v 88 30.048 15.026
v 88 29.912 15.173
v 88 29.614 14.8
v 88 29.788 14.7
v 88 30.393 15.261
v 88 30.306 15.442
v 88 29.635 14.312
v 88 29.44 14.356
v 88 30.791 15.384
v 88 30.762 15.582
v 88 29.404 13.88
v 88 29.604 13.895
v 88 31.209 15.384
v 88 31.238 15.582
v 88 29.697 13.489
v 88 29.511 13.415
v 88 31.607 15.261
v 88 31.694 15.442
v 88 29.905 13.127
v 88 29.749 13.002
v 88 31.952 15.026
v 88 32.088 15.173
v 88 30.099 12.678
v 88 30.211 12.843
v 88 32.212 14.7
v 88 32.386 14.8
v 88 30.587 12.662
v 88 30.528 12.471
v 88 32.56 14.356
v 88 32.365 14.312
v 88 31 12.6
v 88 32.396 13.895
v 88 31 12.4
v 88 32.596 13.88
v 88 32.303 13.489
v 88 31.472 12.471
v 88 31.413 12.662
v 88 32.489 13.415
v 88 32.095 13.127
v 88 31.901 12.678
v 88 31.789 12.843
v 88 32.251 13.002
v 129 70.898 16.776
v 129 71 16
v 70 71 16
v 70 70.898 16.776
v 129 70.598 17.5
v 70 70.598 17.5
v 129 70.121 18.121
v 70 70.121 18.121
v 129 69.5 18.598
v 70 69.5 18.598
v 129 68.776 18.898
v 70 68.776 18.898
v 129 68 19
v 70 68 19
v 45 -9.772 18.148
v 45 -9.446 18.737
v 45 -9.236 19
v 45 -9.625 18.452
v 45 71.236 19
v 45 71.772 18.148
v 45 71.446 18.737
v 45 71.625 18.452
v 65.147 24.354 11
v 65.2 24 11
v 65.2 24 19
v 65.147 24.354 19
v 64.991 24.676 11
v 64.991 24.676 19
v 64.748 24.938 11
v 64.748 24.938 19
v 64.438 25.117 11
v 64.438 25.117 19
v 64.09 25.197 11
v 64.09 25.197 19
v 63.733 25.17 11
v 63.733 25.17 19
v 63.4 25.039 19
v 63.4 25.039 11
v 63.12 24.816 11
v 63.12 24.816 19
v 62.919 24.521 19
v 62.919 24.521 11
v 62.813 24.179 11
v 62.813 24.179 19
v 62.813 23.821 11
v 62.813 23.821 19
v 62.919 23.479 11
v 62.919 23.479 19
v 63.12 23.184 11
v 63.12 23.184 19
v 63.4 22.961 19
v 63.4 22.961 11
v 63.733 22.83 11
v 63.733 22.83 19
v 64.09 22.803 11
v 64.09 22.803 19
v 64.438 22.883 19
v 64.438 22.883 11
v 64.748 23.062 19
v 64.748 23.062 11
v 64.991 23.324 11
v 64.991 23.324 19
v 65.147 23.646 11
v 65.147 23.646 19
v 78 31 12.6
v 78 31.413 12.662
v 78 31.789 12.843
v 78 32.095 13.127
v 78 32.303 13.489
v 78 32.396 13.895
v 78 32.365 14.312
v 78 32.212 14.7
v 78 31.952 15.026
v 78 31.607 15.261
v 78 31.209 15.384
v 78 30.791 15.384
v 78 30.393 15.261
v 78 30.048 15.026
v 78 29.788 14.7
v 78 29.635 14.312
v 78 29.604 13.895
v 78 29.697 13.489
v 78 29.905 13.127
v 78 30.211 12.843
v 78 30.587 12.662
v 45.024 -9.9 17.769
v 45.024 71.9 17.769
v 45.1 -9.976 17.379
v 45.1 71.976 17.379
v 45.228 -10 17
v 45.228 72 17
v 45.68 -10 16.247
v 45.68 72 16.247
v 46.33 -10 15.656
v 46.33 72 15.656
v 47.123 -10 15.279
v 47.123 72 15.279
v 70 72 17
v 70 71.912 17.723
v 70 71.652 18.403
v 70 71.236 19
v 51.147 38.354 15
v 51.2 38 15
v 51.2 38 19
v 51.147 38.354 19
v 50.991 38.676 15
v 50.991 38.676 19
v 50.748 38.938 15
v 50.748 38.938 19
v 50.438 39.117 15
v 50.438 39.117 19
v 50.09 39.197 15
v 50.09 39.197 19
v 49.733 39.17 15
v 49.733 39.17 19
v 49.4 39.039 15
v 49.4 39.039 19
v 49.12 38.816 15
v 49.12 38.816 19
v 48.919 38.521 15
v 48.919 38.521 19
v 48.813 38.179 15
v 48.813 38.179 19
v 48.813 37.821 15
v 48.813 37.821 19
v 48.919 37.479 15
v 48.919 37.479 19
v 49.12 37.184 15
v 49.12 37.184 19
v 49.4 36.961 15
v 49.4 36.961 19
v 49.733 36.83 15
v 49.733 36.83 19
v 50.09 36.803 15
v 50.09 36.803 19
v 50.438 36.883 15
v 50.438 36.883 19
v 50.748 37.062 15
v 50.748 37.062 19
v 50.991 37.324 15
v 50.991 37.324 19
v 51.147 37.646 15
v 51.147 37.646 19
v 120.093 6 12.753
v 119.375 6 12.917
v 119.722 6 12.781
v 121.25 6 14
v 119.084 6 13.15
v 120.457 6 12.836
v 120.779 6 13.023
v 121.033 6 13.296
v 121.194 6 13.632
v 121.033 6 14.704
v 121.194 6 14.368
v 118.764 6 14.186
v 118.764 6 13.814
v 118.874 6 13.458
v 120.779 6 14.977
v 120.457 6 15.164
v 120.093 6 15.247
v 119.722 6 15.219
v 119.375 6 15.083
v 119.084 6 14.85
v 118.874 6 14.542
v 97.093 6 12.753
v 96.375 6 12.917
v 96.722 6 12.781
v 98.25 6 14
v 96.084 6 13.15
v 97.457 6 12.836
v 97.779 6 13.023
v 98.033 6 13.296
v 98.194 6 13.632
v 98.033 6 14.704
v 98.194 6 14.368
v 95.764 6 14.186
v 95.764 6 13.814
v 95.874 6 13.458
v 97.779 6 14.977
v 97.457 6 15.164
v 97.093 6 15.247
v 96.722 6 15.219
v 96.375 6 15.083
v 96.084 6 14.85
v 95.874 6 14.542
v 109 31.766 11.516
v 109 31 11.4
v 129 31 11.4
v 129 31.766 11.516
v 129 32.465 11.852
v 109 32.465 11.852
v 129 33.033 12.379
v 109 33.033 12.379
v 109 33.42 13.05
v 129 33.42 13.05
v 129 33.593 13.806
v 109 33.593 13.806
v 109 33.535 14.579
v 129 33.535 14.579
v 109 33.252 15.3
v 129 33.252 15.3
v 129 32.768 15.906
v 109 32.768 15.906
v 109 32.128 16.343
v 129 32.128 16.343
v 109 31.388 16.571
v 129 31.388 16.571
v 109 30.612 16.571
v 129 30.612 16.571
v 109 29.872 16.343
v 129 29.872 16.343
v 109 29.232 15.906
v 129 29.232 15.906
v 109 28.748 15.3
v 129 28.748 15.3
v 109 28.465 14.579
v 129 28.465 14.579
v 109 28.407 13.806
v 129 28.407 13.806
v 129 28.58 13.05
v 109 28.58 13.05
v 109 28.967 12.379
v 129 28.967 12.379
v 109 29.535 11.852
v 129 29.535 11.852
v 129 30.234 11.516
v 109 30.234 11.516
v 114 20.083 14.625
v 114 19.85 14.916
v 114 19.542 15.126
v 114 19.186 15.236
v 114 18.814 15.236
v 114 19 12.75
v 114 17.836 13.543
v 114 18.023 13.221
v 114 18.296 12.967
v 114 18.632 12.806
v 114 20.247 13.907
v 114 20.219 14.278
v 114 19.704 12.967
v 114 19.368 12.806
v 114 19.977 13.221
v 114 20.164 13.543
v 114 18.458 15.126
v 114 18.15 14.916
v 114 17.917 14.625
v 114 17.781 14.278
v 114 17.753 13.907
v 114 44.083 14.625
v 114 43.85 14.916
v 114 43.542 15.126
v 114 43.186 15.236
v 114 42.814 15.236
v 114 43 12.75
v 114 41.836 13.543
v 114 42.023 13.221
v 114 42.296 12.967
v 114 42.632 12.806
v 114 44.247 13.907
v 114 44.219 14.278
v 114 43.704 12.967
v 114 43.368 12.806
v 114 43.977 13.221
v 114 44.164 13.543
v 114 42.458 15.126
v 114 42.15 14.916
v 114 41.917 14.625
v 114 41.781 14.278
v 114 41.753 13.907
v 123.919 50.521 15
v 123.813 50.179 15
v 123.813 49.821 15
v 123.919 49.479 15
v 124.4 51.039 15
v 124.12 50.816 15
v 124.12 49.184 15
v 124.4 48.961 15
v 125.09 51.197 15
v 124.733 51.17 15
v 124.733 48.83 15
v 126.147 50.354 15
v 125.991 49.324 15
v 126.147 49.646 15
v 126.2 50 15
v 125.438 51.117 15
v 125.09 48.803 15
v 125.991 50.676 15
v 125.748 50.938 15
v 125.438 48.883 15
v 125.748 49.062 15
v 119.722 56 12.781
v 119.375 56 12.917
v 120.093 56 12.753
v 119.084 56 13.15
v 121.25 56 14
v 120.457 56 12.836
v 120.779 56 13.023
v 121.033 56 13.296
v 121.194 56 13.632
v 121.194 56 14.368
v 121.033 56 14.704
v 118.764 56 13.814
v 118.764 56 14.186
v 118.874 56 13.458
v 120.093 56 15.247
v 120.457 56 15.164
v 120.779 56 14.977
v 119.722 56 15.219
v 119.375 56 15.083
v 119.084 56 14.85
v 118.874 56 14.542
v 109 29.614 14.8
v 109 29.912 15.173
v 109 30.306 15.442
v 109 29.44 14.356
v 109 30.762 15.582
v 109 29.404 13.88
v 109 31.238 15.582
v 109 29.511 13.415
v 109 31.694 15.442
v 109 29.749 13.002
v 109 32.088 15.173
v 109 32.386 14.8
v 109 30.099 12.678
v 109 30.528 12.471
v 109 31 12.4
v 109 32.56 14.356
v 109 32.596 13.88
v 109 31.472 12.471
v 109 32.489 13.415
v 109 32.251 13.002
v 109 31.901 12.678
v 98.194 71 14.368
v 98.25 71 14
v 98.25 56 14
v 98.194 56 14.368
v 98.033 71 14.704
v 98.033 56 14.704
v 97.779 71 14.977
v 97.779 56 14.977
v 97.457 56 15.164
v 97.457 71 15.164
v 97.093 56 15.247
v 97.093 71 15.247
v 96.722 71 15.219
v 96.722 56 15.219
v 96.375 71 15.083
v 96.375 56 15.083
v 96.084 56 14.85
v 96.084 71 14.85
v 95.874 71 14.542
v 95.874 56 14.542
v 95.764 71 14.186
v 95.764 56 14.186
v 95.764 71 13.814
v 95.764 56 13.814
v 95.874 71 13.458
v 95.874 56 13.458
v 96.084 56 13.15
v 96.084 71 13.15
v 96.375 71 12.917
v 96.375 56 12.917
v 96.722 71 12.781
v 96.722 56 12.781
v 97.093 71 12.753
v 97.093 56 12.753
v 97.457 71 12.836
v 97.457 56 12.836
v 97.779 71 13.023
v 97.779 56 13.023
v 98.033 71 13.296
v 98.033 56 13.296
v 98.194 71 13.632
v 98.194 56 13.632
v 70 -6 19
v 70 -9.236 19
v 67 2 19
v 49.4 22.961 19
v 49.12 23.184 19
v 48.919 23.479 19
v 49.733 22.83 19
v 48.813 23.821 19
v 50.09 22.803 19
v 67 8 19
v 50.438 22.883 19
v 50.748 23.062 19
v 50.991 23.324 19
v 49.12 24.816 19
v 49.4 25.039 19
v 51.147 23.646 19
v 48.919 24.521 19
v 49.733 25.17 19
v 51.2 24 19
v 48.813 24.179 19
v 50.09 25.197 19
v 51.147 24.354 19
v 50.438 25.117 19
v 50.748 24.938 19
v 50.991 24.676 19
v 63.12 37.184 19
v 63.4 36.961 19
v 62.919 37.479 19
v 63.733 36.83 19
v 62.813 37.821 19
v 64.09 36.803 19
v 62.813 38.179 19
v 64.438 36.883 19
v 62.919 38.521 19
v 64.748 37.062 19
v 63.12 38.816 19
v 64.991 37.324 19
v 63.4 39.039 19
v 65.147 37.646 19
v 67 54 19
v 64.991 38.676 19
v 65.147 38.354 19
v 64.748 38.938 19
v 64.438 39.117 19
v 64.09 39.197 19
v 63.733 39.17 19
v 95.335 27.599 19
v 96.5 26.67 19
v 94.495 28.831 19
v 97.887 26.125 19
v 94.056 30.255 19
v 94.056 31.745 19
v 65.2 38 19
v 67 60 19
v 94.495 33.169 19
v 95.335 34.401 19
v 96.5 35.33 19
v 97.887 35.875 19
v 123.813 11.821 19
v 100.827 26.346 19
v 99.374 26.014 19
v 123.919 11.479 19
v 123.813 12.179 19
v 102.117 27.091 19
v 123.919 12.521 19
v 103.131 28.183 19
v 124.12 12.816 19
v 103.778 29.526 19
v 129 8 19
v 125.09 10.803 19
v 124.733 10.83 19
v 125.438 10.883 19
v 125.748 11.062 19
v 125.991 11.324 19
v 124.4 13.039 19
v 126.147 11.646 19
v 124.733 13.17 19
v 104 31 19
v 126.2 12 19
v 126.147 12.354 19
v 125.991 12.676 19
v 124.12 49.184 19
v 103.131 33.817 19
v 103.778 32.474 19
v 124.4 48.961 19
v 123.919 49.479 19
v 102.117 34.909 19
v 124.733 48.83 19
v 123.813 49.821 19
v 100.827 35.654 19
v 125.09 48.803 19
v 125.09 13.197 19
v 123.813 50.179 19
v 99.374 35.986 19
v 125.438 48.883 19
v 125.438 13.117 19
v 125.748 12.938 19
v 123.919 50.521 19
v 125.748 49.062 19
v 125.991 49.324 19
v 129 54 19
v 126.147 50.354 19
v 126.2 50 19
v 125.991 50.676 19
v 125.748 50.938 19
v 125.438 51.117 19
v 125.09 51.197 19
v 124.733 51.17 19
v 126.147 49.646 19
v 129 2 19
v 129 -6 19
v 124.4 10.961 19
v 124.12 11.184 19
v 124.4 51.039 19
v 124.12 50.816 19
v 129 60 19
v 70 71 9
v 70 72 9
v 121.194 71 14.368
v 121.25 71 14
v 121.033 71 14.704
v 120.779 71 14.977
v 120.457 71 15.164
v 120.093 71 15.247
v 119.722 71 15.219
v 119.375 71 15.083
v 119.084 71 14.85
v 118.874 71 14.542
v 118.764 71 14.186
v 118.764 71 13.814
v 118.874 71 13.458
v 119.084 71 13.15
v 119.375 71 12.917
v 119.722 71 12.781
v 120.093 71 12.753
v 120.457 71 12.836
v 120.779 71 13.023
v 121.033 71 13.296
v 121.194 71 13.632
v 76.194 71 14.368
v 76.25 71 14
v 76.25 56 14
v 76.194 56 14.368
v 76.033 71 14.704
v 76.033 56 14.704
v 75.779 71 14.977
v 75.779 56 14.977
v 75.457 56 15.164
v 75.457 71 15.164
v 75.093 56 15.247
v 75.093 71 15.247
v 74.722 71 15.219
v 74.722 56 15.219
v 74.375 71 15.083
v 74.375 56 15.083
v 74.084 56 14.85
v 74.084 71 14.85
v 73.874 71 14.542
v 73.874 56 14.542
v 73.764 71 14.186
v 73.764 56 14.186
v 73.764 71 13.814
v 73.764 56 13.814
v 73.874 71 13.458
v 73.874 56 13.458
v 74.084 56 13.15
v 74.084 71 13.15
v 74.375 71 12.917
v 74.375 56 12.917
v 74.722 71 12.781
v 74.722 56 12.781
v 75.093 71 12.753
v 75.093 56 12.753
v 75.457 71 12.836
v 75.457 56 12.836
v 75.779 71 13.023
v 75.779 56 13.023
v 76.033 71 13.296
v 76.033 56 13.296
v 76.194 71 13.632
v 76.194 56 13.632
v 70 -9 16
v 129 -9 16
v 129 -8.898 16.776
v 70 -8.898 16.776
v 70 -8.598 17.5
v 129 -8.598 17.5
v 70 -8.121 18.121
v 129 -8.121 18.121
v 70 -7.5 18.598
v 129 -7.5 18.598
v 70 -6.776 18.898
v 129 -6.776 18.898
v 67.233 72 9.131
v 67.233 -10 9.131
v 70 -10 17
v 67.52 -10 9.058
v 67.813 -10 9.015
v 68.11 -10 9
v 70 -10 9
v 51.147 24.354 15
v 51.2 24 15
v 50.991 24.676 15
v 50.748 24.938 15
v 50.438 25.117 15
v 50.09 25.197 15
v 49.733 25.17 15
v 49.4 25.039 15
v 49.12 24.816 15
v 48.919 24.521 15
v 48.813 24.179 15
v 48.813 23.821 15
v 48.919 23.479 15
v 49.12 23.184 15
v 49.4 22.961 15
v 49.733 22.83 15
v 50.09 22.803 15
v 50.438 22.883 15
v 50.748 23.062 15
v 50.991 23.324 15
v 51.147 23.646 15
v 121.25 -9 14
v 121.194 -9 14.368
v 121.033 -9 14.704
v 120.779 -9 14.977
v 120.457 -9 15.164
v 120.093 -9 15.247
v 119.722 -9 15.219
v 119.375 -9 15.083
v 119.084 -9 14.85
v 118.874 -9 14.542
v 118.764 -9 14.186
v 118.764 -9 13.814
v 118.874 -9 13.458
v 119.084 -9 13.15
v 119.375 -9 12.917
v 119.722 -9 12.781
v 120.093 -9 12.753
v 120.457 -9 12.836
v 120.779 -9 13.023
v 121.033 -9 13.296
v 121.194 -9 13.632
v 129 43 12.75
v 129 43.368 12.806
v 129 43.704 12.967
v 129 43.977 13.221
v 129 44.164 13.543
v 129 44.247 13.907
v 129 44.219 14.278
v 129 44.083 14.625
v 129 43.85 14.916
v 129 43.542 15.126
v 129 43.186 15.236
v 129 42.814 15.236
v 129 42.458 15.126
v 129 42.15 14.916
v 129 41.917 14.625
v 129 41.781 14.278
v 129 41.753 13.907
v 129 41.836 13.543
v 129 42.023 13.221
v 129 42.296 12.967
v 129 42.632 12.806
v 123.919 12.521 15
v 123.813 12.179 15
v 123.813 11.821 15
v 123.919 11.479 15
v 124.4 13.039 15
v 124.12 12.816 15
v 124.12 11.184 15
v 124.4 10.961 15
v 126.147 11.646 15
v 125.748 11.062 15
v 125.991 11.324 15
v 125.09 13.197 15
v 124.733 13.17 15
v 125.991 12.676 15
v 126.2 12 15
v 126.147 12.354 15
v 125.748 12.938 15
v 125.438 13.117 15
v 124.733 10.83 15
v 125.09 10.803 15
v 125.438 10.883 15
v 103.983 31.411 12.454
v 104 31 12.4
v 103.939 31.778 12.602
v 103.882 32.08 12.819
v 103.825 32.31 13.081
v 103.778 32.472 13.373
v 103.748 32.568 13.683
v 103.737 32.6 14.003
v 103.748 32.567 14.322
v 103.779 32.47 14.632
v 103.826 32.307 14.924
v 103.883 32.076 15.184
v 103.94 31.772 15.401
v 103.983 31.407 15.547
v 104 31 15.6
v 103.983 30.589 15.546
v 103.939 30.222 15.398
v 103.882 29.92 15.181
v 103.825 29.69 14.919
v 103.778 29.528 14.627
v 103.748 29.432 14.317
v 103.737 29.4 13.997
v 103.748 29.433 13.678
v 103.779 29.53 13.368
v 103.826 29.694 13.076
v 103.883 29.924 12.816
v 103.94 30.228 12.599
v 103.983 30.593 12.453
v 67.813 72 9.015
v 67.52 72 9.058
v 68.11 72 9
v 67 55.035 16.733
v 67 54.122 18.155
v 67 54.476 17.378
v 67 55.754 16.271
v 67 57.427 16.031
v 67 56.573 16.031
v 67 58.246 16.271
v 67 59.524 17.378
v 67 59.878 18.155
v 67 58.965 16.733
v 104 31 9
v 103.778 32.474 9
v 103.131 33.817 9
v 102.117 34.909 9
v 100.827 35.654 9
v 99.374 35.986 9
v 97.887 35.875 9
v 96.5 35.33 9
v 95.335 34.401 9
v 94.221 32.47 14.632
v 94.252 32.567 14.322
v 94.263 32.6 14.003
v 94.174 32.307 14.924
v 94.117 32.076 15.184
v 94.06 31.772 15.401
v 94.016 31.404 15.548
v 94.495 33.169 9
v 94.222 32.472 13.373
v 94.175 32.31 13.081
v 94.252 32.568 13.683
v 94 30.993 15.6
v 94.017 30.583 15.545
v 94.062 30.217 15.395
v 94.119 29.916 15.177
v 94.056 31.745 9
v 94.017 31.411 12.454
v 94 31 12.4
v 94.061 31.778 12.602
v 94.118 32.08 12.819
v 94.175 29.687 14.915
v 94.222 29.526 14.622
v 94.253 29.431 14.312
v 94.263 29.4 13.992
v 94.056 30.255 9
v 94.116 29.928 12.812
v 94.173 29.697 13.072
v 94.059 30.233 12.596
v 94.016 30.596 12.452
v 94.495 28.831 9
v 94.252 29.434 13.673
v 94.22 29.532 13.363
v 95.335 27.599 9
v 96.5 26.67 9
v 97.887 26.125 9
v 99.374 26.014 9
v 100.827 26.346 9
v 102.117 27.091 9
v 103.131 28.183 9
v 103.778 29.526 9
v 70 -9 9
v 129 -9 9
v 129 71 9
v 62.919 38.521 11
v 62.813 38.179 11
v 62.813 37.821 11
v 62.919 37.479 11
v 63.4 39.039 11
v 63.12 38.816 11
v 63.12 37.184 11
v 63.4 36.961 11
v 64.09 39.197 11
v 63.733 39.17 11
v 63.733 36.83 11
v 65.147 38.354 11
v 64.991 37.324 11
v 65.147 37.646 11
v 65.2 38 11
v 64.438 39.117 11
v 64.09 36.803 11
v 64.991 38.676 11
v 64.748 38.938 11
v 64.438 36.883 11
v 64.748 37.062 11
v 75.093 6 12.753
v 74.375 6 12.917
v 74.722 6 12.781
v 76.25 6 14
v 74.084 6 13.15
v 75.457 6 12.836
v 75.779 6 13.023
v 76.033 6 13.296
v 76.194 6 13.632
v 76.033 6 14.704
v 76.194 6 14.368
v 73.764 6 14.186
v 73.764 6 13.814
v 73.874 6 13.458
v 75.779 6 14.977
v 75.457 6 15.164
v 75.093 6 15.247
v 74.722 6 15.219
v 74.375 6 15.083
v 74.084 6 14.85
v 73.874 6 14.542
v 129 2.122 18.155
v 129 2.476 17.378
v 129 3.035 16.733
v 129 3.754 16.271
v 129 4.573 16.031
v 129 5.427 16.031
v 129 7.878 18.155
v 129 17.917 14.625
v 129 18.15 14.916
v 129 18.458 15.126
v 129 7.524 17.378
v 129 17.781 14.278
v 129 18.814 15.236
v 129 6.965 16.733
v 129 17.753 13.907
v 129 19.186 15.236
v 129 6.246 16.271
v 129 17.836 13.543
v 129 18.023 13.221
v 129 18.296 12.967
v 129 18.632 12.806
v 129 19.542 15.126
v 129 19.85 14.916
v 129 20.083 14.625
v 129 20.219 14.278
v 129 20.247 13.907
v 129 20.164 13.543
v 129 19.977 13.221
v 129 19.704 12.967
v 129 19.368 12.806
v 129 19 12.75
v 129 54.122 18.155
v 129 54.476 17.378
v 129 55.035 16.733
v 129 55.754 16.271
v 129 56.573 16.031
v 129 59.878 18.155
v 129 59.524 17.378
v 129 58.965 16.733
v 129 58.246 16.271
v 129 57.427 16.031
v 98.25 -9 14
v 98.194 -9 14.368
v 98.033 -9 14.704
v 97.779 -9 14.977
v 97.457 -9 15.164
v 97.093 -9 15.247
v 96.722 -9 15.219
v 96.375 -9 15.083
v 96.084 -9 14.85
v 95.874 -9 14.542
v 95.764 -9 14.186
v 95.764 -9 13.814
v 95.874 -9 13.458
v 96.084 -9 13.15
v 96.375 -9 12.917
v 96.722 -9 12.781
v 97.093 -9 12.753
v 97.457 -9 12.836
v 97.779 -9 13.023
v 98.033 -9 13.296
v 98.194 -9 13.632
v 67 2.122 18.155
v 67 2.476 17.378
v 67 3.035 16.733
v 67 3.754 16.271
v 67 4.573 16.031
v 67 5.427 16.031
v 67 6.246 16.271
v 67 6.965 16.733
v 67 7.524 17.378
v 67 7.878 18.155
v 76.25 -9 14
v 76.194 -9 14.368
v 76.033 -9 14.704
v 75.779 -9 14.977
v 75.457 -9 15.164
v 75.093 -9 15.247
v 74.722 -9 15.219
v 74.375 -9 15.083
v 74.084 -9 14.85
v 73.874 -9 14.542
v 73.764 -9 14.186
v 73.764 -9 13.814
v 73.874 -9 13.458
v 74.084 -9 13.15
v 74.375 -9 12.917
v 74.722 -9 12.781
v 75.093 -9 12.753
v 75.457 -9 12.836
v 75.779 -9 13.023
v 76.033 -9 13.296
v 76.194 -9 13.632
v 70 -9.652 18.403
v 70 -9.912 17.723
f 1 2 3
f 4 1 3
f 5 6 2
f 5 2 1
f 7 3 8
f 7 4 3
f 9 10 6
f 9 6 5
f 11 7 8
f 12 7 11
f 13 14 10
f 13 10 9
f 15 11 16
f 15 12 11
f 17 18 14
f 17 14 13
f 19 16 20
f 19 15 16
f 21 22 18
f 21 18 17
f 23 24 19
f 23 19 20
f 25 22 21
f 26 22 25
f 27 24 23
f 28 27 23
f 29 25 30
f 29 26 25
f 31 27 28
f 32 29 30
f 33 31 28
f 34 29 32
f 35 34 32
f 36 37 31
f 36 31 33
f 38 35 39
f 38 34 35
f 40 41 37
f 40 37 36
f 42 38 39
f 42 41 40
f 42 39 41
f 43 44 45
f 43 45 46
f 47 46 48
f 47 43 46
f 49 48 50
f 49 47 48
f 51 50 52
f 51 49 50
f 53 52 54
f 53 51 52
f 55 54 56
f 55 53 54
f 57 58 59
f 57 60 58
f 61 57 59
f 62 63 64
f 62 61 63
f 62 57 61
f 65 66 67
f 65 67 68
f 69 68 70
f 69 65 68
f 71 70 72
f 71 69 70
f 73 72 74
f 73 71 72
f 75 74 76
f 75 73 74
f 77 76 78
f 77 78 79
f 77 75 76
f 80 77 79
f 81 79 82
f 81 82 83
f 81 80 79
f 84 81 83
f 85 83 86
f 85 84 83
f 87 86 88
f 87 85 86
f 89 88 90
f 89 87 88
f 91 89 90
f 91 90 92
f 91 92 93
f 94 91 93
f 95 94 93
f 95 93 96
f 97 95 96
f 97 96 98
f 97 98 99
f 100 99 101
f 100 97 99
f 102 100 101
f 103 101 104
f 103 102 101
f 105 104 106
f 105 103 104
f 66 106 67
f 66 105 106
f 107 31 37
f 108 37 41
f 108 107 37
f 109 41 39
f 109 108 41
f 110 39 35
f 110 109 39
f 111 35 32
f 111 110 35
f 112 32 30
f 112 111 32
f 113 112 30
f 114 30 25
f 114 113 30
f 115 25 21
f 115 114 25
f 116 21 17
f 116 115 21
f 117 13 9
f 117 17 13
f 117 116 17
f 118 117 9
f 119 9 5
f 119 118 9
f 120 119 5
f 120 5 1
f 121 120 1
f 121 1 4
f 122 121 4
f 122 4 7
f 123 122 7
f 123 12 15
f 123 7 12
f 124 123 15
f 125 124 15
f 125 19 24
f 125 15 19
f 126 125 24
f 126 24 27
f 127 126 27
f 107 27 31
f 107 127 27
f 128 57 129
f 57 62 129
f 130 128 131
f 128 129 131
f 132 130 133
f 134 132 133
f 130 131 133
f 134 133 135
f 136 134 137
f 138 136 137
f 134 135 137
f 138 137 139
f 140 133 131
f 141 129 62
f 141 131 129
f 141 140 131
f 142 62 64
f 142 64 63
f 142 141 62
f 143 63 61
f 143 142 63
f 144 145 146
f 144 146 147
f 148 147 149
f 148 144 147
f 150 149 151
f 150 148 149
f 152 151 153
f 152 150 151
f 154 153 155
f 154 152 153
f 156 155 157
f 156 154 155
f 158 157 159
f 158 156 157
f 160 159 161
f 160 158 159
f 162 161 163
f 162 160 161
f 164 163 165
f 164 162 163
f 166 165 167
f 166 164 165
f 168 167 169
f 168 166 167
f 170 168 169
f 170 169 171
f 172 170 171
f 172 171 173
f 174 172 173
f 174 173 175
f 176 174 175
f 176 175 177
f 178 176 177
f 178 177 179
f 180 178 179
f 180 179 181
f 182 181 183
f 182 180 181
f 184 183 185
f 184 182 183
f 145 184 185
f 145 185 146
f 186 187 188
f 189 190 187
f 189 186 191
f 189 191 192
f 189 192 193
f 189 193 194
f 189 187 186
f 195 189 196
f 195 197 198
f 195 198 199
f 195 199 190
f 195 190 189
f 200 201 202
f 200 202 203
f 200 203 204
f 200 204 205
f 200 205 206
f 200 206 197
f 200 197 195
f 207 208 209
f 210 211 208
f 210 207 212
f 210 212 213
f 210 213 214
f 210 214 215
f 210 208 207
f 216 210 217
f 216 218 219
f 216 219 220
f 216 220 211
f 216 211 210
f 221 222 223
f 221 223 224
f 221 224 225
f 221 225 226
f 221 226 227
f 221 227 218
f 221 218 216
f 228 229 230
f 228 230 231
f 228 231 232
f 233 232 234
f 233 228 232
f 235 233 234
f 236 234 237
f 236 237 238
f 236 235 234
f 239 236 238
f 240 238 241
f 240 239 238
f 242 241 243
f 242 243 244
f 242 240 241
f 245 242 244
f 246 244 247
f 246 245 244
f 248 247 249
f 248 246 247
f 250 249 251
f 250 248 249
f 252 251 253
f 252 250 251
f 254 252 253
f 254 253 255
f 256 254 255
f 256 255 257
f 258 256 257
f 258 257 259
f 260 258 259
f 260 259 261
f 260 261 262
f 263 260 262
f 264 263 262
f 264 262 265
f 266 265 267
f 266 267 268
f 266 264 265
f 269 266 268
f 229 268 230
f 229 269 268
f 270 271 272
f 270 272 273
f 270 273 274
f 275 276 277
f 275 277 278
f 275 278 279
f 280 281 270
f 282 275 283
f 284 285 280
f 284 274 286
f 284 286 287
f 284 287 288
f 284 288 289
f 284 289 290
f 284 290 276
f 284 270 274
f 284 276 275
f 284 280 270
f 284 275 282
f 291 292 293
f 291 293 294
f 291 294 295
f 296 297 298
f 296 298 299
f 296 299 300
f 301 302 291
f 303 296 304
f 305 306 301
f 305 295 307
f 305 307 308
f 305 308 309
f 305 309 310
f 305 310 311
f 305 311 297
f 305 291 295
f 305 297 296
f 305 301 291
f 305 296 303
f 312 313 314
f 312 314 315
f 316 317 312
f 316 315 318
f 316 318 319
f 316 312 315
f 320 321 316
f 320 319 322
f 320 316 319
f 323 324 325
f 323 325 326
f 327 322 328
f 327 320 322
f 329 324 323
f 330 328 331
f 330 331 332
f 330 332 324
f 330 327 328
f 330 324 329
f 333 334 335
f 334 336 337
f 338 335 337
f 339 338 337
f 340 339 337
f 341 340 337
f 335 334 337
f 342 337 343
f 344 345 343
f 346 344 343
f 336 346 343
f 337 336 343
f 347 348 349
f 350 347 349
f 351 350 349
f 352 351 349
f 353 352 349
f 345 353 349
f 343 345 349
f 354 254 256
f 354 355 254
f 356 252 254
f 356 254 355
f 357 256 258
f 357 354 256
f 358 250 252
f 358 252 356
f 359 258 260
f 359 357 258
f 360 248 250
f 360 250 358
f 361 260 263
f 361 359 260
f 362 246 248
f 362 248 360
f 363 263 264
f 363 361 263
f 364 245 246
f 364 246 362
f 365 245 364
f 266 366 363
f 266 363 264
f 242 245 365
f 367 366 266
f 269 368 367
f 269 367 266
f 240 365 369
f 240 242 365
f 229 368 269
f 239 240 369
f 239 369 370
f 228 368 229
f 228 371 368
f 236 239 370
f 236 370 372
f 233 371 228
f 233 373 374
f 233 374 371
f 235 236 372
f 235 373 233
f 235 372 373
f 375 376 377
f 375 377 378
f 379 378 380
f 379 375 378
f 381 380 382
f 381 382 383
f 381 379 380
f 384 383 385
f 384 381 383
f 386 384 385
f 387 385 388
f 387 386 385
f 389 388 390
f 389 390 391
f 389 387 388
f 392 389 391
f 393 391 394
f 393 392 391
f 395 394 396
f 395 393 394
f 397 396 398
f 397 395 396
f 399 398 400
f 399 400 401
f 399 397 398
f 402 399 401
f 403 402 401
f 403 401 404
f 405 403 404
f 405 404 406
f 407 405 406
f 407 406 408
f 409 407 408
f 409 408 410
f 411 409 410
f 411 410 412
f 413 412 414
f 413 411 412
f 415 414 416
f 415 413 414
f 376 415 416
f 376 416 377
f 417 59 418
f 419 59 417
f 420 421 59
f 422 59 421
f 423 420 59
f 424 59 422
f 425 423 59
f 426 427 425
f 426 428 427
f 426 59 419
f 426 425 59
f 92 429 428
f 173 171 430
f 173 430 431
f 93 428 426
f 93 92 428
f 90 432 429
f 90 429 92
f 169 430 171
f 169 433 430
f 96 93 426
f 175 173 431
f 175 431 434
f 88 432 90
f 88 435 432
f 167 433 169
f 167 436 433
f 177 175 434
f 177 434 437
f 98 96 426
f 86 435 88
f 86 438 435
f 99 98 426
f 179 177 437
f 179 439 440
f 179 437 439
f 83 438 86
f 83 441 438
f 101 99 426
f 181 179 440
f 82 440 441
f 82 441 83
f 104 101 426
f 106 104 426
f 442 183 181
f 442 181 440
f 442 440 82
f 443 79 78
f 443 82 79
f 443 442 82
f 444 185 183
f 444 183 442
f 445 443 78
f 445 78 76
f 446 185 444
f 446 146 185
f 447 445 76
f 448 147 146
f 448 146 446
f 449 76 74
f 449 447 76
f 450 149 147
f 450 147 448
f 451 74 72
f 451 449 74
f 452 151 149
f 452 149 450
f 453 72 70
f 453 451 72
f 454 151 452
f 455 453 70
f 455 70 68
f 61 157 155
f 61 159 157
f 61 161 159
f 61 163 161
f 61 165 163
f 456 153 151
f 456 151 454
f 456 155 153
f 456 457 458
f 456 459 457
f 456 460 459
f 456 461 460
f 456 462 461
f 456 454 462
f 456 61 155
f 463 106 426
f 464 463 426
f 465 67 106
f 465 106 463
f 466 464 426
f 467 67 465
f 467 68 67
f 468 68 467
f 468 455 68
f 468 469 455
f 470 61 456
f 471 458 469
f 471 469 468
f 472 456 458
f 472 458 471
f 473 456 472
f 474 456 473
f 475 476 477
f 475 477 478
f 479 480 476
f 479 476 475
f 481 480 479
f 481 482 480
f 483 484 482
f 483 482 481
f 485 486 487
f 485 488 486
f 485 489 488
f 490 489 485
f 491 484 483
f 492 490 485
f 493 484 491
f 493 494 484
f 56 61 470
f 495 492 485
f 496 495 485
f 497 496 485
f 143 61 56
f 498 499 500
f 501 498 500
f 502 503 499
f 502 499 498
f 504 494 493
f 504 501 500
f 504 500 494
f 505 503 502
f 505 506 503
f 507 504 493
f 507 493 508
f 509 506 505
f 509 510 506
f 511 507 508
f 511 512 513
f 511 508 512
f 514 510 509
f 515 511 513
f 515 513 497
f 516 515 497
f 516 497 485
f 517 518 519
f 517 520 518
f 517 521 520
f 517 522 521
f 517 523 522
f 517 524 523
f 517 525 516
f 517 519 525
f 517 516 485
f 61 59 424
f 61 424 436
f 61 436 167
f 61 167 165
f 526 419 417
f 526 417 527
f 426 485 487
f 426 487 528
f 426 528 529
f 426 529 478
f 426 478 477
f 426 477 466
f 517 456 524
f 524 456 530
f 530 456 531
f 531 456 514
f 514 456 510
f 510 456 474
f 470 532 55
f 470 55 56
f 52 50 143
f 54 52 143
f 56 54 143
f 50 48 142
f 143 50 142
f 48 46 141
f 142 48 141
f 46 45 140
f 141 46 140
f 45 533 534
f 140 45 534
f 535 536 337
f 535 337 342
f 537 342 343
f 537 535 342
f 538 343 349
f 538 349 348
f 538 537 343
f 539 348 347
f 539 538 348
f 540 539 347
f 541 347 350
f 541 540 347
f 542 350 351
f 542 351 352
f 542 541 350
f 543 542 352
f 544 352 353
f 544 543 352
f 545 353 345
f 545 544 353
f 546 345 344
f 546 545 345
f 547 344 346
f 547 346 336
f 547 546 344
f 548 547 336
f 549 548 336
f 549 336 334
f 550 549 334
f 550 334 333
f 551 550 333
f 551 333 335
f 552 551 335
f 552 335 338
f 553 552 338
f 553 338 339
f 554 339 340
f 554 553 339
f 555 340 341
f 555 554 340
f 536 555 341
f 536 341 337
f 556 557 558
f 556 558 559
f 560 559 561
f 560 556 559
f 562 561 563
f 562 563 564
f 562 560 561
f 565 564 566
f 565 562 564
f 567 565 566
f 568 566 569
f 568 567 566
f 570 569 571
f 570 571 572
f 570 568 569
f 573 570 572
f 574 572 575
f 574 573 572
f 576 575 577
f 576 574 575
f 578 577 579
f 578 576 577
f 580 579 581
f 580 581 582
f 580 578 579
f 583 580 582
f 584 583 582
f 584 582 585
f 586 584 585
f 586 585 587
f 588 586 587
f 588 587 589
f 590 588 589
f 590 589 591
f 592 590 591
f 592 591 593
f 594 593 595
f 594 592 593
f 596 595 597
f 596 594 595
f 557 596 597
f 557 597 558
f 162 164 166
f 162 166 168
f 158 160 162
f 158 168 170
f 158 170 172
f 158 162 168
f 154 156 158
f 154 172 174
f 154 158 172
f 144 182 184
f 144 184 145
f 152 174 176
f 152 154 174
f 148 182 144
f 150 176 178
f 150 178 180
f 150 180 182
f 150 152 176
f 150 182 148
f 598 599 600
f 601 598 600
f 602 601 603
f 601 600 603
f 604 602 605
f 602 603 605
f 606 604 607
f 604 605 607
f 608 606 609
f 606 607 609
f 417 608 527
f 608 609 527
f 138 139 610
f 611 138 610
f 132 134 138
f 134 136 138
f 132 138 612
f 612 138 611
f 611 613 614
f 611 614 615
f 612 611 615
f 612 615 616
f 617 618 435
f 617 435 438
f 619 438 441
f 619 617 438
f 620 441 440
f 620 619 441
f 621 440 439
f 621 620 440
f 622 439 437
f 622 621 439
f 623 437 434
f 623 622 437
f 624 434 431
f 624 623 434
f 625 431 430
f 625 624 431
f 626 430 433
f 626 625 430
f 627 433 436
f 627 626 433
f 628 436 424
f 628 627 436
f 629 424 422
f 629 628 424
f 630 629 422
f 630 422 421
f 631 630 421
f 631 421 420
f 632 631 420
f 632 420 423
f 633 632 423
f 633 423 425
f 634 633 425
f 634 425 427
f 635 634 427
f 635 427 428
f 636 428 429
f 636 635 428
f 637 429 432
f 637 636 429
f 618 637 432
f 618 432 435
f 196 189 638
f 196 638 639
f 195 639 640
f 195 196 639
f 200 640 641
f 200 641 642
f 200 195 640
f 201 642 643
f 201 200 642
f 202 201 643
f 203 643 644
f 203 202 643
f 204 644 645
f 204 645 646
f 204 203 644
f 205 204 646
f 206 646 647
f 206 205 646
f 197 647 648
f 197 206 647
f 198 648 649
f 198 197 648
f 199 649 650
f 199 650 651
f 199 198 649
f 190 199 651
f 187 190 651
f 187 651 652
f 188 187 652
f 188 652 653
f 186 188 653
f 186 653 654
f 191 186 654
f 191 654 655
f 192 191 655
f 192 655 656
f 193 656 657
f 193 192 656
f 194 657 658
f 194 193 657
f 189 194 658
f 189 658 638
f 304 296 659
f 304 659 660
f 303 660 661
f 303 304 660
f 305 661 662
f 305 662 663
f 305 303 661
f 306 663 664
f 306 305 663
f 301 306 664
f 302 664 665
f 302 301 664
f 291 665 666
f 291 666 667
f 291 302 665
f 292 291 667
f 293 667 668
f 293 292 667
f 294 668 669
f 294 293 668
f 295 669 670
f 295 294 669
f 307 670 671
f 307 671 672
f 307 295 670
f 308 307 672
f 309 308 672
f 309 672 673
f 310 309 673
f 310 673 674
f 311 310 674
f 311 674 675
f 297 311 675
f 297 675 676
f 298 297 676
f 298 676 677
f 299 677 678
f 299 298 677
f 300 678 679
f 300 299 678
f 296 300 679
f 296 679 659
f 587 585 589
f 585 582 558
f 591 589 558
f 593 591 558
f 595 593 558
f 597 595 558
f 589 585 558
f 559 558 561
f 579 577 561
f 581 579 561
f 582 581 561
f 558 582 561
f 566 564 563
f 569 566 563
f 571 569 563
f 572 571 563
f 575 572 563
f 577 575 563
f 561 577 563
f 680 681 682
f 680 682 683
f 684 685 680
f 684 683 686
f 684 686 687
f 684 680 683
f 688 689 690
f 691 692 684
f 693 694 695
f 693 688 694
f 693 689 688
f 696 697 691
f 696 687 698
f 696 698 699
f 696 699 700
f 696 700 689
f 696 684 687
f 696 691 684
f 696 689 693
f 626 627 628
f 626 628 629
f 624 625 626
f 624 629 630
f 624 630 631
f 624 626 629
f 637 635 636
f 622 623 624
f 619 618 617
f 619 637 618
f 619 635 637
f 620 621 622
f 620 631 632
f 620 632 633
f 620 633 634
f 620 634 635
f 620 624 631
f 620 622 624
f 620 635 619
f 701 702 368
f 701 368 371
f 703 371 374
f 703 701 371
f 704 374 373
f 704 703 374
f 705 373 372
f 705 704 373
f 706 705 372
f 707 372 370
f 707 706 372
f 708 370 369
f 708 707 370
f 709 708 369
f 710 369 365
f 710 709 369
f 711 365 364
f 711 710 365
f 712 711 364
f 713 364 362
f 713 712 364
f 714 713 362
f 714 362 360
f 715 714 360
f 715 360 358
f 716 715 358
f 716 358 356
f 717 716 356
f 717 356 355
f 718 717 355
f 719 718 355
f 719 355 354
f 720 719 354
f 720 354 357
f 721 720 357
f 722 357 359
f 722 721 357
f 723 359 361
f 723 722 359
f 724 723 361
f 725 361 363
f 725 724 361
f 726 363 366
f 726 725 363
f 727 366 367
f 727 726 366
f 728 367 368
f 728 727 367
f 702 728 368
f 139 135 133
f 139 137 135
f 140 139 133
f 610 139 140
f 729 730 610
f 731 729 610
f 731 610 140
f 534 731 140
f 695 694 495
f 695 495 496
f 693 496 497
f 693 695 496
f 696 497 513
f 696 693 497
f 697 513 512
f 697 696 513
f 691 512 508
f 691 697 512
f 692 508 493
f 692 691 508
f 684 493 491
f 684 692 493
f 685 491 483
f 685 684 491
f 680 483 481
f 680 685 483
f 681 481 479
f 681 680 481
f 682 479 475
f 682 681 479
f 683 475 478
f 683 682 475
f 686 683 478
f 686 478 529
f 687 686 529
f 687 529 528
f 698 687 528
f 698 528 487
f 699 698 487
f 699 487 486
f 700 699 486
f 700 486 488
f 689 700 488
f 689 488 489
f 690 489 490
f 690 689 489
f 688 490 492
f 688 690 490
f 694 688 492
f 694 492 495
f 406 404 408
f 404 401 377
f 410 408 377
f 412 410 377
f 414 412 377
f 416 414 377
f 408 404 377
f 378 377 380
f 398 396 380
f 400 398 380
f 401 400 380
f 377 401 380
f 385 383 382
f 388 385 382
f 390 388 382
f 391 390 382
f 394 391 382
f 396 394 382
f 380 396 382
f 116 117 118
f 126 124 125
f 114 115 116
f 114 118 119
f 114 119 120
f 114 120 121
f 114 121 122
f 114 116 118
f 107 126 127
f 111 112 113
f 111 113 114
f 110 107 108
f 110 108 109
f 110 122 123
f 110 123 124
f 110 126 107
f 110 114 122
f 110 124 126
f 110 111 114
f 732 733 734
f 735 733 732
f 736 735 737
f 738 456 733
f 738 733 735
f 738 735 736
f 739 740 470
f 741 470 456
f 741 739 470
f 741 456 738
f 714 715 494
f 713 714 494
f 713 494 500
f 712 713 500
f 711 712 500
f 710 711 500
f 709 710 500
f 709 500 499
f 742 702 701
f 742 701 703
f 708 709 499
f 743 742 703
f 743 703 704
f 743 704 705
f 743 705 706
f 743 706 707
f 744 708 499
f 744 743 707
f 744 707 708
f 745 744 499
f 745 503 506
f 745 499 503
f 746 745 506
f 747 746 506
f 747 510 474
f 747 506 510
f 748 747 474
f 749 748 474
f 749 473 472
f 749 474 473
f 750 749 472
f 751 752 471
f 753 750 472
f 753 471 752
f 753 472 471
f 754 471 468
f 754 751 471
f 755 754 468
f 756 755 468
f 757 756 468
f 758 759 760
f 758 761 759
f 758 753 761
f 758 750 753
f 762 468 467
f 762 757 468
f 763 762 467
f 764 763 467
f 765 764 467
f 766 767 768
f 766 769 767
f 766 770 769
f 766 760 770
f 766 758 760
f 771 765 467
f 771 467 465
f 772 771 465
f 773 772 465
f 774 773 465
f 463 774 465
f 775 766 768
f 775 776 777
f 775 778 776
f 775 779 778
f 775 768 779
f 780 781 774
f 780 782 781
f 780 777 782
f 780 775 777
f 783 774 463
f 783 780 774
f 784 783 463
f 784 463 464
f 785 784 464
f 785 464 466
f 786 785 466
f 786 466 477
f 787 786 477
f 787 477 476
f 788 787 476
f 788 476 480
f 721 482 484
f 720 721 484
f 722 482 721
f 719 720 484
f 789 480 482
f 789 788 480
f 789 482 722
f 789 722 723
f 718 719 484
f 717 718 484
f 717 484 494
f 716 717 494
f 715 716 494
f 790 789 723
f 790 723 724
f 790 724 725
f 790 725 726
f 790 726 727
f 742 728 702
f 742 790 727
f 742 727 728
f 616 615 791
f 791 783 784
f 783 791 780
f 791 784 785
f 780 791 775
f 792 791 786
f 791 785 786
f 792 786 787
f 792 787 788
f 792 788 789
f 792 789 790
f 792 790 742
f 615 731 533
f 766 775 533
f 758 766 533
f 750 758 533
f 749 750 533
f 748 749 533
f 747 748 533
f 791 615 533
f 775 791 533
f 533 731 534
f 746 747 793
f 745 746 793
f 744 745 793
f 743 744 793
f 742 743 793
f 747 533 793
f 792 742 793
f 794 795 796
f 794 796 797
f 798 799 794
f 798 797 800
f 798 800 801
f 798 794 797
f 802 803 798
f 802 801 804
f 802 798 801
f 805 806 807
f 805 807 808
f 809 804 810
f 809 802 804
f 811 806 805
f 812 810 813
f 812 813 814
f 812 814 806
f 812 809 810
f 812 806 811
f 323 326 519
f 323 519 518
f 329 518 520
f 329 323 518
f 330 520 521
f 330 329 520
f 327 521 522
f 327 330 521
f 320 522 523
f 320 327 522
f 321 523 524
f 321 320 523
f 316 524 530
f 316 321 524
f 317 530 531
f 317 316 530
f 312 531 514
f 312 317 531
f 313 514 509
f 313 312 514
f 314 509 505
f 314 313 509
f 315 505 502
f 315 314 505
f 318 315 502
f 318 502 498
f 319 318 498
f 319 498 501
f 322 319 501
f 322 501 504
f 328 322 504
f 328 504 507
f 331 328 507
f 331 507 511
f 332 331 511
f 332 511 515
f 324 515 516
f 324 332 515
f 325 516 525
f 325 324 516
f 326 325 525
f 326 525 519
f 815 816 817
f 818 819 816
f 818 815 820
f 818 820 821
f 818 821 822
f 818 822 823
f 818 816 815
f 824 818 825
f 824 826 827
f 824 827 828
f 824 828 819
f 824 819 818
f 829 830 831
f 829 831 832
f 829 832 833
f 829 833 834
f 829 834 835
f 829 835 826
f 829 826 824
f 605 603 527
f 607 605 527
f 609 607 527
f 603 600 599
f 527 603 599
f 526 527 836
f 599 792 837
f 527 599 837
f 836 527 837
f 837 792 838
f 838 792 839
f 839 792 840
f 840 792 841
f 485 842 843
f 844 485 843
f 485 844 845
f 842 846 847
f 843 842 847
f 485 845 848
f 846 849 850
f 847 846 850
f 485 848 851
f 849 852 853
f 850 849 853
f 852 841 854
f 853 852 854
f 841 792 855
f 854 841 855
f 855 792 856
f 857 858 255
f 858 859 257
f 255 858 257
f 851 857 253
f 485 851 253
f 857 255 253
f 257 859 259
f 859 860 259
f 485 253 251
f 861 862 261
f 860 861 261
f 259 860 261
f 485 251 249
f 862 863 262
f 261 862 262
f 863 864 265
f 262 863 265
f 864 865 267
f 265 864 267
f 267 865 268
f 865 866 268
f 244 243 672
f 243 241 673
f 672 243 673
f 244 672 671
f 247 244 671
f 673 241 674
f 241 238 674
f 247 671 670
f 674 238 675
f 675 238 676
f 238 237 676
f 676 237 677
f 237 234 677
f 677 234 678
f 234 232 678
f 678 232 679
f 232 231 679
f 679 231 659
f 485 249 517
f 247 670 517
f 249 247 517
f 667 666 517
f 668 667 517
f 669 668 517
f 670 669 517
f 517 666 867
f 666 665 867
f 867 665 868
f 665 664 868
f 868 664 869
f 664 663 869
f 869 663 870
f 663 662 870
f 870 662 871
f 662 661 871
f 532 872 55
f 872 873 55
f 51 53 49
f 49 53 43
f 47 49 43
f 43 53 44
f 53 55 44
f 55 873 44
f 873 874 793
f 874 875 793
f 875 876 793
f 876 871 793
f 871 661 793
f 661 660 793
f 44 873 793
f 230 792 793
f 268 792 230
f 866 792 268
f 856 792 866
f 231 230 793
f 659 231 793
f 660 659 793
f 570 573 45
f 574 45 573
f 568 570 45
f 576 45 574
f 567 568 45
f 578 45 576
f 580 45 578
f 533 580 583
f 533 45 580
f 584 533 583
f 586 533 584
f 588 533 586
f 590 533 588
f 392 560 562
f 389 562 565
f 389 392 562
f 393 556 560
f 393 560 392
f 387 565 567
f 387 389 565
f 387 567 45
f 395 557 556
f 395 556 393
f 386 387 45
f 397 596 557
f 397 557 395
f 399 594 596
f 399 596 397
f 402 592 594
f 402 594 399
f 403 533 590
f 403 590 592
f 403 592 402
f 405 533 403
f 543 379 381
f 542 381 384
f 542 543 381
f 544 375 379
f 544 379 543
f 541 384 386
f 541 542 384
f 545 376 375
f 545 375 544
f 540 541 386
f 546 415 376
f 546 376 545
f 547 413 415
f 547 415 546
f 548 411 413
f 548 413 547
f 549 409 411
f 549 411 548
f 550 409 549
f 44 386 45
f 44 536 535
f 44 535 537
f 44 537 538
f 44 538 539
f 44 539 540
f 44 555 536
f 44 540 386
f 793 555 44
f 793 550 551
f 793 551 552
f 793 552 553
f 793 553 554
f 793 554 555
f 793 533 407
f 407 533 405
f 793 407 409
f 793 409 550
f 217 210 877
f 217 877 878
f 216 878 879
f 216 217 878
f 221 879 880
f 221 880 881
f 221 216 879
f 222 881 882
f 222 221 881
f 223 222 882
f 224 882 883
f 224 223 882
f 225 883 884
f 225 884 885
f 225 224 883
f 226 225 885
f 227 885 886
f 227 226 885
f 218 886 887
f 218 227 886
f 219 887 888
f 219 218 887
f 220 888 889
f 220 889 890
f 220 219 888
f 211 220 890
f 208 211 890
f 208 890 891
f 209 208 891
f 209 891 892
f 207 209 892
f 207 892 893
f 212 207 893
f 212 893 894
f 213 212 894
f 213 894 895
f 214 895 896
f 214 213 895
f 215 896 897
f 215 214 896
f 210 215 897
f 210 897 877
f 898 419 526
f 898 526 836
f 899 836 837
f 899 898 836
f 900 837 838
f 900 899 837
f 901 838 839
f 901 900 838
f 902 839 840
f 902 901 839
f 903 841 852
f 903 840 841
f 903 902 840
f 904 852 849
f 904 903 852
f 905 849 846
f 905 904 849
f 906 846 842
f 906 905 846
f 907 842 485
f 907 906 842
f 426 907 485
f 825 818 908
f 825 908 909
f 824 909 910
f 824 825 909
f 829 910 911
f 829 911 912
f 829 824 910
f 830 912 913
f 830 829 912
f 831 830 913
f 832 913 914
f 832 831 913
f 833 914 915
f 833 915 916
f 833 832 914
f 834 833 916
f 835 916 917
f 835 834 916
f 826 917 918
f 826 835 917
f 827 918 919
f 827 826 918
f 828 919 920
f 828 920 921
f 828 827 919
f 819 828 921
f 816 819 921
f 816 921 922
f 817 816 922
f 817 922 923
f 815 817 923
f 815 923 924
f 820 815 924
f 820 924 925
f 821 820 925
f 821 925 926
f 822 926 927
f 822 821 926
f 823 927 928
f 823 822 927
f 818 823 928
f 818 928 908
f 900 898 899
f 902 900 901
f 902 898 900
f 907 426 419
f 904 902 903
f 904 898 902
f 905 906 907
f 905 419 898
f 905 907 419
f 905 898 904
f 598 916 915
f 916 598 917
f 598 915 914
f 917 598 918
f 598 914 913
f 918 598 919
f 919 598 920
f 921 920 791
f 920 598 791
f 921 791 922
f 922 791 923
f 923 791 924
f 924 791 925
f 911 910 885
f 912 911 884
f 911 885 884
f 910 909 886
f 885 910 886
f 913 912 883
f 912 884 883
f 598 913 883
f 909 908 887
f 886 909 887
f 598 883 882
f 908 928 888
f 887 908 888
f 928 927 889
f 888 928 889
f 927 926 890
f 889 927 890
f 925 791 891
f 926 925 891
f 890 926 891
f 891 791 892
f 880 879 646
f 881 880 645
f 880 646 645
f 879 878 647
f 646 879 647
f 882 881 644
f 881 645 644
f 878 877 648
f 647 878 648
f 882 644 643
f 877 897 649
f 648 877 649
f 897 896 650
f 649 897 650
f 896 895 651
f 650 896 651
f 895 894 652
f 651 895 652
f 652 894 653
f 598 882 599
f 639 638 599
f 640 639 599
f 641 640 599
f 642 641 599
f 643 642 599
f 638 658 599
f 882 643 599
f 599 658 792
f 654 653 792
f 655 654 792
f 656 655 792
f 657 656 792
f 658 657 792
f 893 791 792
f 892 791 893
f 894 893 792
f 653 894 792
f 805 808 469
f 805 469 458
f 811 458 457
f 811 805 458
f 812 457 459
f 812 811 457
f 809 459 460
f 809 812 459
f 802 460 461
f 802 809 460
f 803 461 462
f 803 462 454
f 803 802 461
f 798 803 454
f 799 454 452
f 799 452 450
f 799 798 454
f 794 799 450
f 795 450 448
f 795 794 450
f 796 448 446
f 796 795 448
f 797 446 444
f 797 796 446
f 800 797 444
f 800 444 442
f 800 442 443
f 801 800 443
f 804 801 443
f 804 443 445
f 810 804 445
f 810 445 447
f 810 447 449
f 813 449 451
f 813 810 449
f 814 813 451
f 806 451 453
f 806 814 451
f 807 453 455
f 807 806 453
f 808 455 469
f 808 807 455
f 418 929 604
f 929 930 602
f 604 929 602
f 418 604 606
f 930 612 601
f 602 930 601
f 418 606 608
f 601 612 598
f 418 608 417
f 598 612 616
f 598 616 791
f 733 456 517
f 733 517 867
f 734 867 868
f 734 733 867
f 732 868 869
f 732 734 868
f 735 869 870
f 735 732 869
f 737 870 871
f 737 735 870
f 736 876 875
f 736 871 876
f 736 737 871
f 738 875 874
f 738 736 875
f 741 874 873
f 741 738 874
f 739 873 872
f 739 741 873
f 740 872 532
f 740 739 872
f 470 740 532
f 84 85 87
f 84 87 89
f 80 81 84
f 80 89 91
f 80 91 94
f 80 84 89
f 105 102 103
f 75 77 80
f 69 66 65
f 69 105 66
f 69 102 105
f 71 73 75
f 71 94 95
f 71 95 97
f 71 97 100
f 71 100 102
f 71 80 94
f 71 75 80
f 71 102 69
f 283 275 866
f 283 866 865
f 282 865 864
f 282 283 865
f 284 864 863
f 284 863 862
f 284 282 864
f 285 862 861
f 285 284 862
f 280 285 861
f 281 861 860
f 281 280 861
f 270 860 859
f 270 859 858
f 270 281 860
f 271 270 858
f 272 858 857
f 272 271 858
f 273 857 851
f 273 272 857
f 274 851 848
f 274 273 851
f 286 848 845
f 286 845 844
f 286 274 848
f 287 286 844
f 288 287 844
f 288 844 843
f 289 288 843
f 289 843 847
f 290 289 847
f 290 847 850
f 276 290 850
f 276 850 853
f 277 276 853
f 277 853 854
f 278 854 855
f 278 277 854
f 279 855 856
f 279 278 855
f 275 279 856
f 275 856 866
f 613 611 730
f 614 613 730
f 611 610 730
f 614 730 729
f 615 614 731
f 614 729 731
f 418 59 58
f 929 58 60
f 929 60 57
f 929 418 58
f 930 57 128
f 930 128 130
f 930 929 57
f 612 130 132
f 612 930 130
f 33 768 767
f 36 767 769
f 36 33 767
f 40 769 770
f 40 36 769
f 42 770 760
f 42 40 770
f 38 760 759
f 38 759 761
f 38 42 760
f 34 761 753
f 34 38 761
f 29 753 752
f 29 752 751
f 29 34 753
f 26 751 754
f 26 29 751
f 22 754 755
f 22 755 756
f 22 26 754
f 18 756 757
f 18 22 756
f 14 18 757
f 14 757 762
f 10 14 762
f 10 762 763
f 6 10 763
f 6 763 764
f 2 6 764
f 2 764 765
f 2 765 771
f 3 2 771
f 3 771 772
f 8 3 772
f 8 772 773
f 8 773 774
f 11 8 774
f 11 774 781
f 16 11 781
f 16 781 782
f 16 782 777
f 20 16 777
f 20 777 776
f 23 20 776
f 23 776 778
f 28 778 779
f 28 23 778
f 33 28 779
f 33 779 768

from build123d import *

# Parameters (mm, degrees)
CYLINDER284_R          = 3
CYLINDER284_DEPTH      = 62
CYLINDER285_R          = 3
CYLINDER285_DEPTH      = 62
CYLINDER280_R          = 1.2
CYLINDER280_DEPTH      = 4
CYLINDER281_R          = 1.2
CYLINDER281_DEPTH      = 4
CYLINDER282_R          = 1.2
CYLINDER282_DEPTH      = 8
CYLINDER283_R          = 1.2
CYLINDER283_DEPTH      = 8
CYLINDER453_R          = 1.2
CYLINDER453_DEPTH      = 4
CYLINDER452_R          = 1.2
CYLINDER452_DEPTH      = 4
CYLINDER457_R          = 1.25
CYLINDER457_DEPTH      = 15
CYLINDER456_R          = 1.25
CYLINDER456_DEPTH      = 15
BOX301_W               = 25
BOX301_H               = 82
BOX301_DEPTH           = 1
CYLINDER278_R          = 1.25
CYLINDER278_DEPTH      = 15
CYLINDER277_R          = 1.25
CYLINDER277_DEPTH      = 15
CYLINDER279_R          = 1.25
CYLINDER279_DEPTH      = 15
CYLINDER272_R          = 1.6
CYLINDER272_DEPTH      = 41
CYLINDER274_R          = 2.6
CYLINDER274_DEPTH      = 20
CYLINDER273_R          = 1.4
CYLINDER273_DEPTH      = 51
CYLINDER286_R          = 1.25
CYLINDER286_DEPTH      = 15
CYLINDER287_R          = 1.25
CYLINDER287_DEPTH      = 15
CYLINDER288_R          = 1.25
CYLINDER288_DEPTH      = 15
CYLINDER271_R          = 5
CYLINDER271_DEPTH      = 19
BOX215_W               = 30
BOX215_H               = 82
BOX215_DEPTH           = 10
BOX215_PLACEMENT_ANGLE = 17
BOX214_W               = 25
BOX214_H               = 62
BOX214_DEPTH           = 1.5
BOX213_W               = 25
BOX213_H               = 82
BOX213_DEPTH           = 11
FILLET085_R            = 3
BOX212_W               = 60
BOX212_H               = 80
BOX212_DEPTH           = 10
FILLET084_R            = 3
FILLET086_R            = 3


with BuildPart() as cylinder284:
    # Cylinder284 → Cylinder284 (new body)
    with BuildSketch(Plane(origin=(67, 5, 19), x_dir=(0, 0, -1), z_dir=(1, 0, 0))):
        Circle(CYLINDER284_R)
    extrude(amount=CYLINDER284_DEPTH)


with BuildPart() as fusion252:
    # Cylinder285 → Cylinder285 (new body)
    with BuildSketch(Plane(origin=(67, 57, 19), x_dir=(0, 0, -1), z_dir=(1, 0, 0))):
        Circle(CYLINDER285_R)
    extrude(amount=CYLINDER285_DEPTH)

    # Fusion252: union Cylinder284
    add(cylinder284.part)


with BuildPart() as cylinder280:
    # Cylinder280 → Cylinder280 (new body)
    with BuildSketch(Plane(origin=(50, 24, 15), x_dir=(1, 0, 0), z_dir=(0, 0, 1))):
        Circle(CYLINDER280_R)
    extrude(amount=CYLINDER280_DEPTH)


with BuildPart() as cylinder281:
    # Cylinder281 → Cylinder281 (new body)
    with BuildSketch(Plane(origin=(50, 38, 15), x_dir=(1, 0, 0), z_dir=(0, 0, 1))):
        Circle(CYLINDER281_R)
    extrude(amount=CYLINDER281_DEPTH)


with BuildPart() as cylinder282:
    # Cylinder282 → Cylinder282 (new body)
    with BuildSketch(Plane(origin=(64, 24, 11), x_dir=(1, 0, 0), z_dir=(0, 0, 1))):
        Circle(CYLINDER282_R)
    extrude(amount=CYLINDER282_DEPTH)


with BuildPart() as cylinder283:
    # Cylinder283 → Cylinder283 (new body)
    with BuildSketch(Plane(origin=(64, 38, 11), x_dir=(1, 0, 0), z_dir=(0, 0, 1))):
        Circle(CYLINDER283_R)
    extrude(amount=CYLINDER283_DEPTH)


with BuildPart() as cylinder453:
    # Cylinder453 → Cylinder453 (new body)
    with BuildSketch(Plane(origin=(125, 12, 15), x_dir=(1, 0, 0), z_dir=(0, 0, 1))):
        Circle(CYLINDER453_R)
    extrude(amount=CYLINDER453_DEPTH)


with BuildPart() as fusion406:
    # Cylinder452 → Cylinder452 (new body)
    with BuildSketch(Plane(origin=(125, 50, 15), x_dir=(1, 0, 0), z_dir=(0, 0, 1))):
        Circle(CYLINDER452_R)
    extrude(amount=CYLINDER452_DEPTH)

    # Fusion406: union Cylinder280, Cylinder281, Cylinder282, Cylinder283, Cylinder453
    add(cylinder280.part)
    add(cylinder281.part)
    add(cylinder282.part)
    add(cylinder283.part)
    add(cylinder453.part)


with BuildPart() as cylinder457:
    # Cylinder457 → Cylinder457 (new body)
    with BuildSketch(Plane(origin=(80, 43, 14), x_dir=(0, 0, -1), z_dir=(1, 0, 0))):
        Circle(CYLINDER457_R)
    extrude(amount=CYLINDER457_DEPTH)


with BuildPart() as fusion414:
    # Cylinder456 → Cylinder456 (new body)
    with BuildSketch(Plane(origin=(80, 19, 14), x_dir=(0, 0, -1), z_dir=(1, 0, 0))):
        Circle(CYLINDER456_R)
    extrude(amount=CYLINDER456_DEPTH)

    # Fusion413: union Cylinder457
    add(cylinder457.part)


with BuildPart() as fusion414_1:
    # Fusion413 placement: moved
    add(fusion414.part.moved(Location((34, 0, 0))))

    # Fusion414: union Fusion252, Fusion406
    add(fusion252.part)
    add(fusion406.part)


with BuildPart() as cube372:
    # Box301 → Box301 (new body)
    with BuildSketch(Plane(origin=(45, -10, 19), x_dir=(1, 0, 0), z_dir=(0, 0, 1))):
        with Locations((12.5, 41)):
            Rectangle(BOX301_W, BOX301_H)
    extrude(amount=BOX301_DEPTH)


with BuildPart() as cylinder278:
    # Cylinder278 → Cylinder278 (new body)
    with BuildSketch(Plane(origin=(6, 15, 14), x_dir=(1, 0, 0), z_dir=(0, -1, 0))):
        Circle(CYLINDER278_R)
    extrude(amount=CYLINDER278_DEPTH)


with BuildPart() as cylinder277:
    # Cylinder277 → Cylinder277 (new body)
    with BuildSketch(Plane(origin=(28, 15, 14), x_dir=(1, 0, 0), z_dir=(0, -1, 0))):
        Circle(CYLINDER277_R)
    extrude(amount=CYLINDER277_DEPTH)


with BuildPart() as fusion246:
    # Cylinder279 → Cylinder279 (new body)
    with BuildSketch(Plane(origin=(51, 15, 14), x_dir=(1, 0, 0), z_dir=(0, -1, 0))):
        Circle(CYLINDER279_R)
    extrude(amount=CYLINDER279_DEPTH)

    # Fusion246: union Cylinder278, Cylinder277
    add(cylinder278.part)
    add(cylinder277.part)


with BuildPart() as fusion246_1:
    # Fusion246 placement: moved
    add(fusion246.part.moved(Location((0, 56, 0))))


with BuildPart() as cylinder272:
    # Cylinder272 → Cylinder272 (new body)
    with BuildSketch(Plane(origin=(20, 31, 10), x_dir=(0, 0, -1), z_dir=(1, 0, 0))):
        Circle(CYLINDER272_R)
    extrude(amount=CYLINDER272_DEPTH)


with BuildPart() as cylinder274:
    # Cylinder274 → Cylinder274 (new body)
    with BuildSketch(Plane(origin=(41, 31, 10), x_dir=(0, 0, -1), z_dir=(1, 0, 0))):
        Circle(CYLINDER274_R)
    extrude(amount=CYLINDER274_DEPTH)


with BuildPart() as fusion249:
    # Cylinder273 → Cylinder273 (new body)
    with BuildSketch(Plane(origin=(10, 31, 10), x_dir=(0, 0, -1), z_dir=(1, 0, 0))):
        Circle(CYLINDER273_R)
    extrude(amount=CYLINDER273_DEPTH)

    # Fusion249: union Cylinder272, Cylinder274
    add(cylinder272.part)
    add(cylinder274.part)


with BuildPart() as fusion249_1:
    # Fusion249 placement: moved
    add(fusion249.part.moved(Location((-1, 0, 4))))


with BuildPart() as cylinder286:
    # Cylinder286 → Cylinder286 (new body)
    with BuildSketch(Plane(origin=(6, 15, 14), x_dir=(1, 0, 0), z_dir=(0, -1, 0))):
        Circle(CYLINDER286_R)
    extrude(amount=CYLINDER286_DEPTH)


with BuildPart() as cylinder287:
    # Cylinder287 → Cylinder287 (new body)
    with BuildSketch(Plane(origin=(28, 15, 14), x_dir=(1, 0, 0), z_dir=(0, -1, 0))):
        Circle(CYLINDER287_R)
    extrude(amount=CYLINDER287_DEPTH)


with BuildPart() as fusion254:
    # Cylinder288 → Cylinder288 (new body)
    with BuildSketch(Plane(origin=(51, 15, 14), x_dir=(1, 0, 0), z_dir=(0, -1, 0))):
        Circle(CYLINDER288_R)
    extrude(amount=CYLINDER288_DEPTH)

    # Fusion254: union Cylinder286, Cylinder287
    add(cylinder286.part)
    add(cylinder287.part)


with BuildPart() as fusion254_1:
    # Fusion254 placement: moved
    add(fusion254.part.moved(Location((0, -9, 0))))


with BuildPart() as fusion255:
    # Cylinder271 → Cylinder271 (new body)
    with BuildSketch(Plane(origin=(30, 31, 6), x_dir=(1, 0, 0), z_dir=(0, 0, 1))):
        Circle(CYLINDER271_R)
    extrude(amount=CYLINDER271_DEPTH)

    # Fusion255: union Fusion246, Fusion249, Fusion254
    add(fusion246_1.part)
    add(fusion249_1.part)
    add(fusion254_1.part)


with BuildPart() as cube295:
    # Box215 → Box215 (new body)
    with BuildSketch(Plane.XY):
        with Locations((15, 41)):
            Rectangle(BOX215_W, BOX215_H)
    extrude(amount=BOX215_DEPTH)


with BuildPart() as cube295_1:
    # Box215 placement: moved
    add(cube295.part.moved(Location((-29, -10, 7))).rotate(Axis((-29, -10, 7), (0, 1, 0)), BOX215_PLACEMENT_ANGLE))


with BuildPart() as cube294:
    # Box214 → Box214 (new body)
    with BuildSketch(Plane(origin=(-24, 0, 19), x_dir=(1, 0, 0), z_dir=(0, 0, 1))):
        with Locations((12.5, 31)):
            Rectangle(BOX214_W, BOX214_H)
    extrude(amount=BOX214_DEPTH)


with BuildPart() as fillet085:
    # Box213 → Box213 (new body)
    with BuildSketch(Plane(origin=(-24, -10, 9), x_dir=(1, 0, 0), z_dir=(0, 0, 1))):
        with Locations((12.5, 41)):
            Rectangle(BOX213_W, BOX213_H)
    extrude(amount=BOX213_DEPTH)

    # Cut222: cut Cube294
    add(cube294.part, mode=Mode.SUBTRACT)

    # Fillet085
    fillet085_edges = [fillet085.edges().sort_by_distance(p)[0] for p in [
        (-11.5, -10, 20),
        (-11.5, 72, 20),
    ]]
    fillet(fillet085_edges, radius=FILLET085_R)


with BuildPart() as fifth_wheel_plate_wide:
    # Box212 → Box212 (new body)
    with BuildSketch(Plane(origin=(0, -9, 9), x_dir=(1, 0, 0), z_dir=(0, 0, 1))):
        with Locations((30, 40)):
            Rectangle(BOX212_W, BOX212_H)
    extrude(amount=BOX212_DEPTH)

    # Fillet084
    fillet084_edges = [fifth_wheel_plate_wide.edges().sort_by_distance(p)[0] for p in [
        (30, -9, 19),
        (30, 71, 19),
    ]]
    fillet(fillet084_edges, radius=FILLET084_R)

    # Fusion253: union Fillet085
    add(fillet085.part)

    # Cut223: cut Cube295
    add(cube295_1.part, mode=Mode.SUBTRACT)

    # Cut224: cut Fusion255
    add(fusion255.part, mode=Mode.SUBTRACT)


with BuildPart() as fifth_wheel_plate_wide_1:
    # Cut224 placement: moved
    add(fifth_wheel_plate_wide.part.moved(Location((69, 0, 0))))

    # Fillet086
    fillet086_edges = [fifth_wheel_plate_wide_1.edges().sort_by_distance(p)[0] for p in [
        (67.661331, 31, 9),
        (45, 31, 15.928264),
    ]]
    fillet(fillet086_edges, radius=FILLET086_R)

    # Cut299: cut Cube372
    add(cube372.part, mode=Mode.SUBTRACT)

    # Cut304: cut Fusion414
    add(fusion414_1.part, mode=Mode.SUBTRACT)


solid = fifth_wheel_plate_wide_1.part
